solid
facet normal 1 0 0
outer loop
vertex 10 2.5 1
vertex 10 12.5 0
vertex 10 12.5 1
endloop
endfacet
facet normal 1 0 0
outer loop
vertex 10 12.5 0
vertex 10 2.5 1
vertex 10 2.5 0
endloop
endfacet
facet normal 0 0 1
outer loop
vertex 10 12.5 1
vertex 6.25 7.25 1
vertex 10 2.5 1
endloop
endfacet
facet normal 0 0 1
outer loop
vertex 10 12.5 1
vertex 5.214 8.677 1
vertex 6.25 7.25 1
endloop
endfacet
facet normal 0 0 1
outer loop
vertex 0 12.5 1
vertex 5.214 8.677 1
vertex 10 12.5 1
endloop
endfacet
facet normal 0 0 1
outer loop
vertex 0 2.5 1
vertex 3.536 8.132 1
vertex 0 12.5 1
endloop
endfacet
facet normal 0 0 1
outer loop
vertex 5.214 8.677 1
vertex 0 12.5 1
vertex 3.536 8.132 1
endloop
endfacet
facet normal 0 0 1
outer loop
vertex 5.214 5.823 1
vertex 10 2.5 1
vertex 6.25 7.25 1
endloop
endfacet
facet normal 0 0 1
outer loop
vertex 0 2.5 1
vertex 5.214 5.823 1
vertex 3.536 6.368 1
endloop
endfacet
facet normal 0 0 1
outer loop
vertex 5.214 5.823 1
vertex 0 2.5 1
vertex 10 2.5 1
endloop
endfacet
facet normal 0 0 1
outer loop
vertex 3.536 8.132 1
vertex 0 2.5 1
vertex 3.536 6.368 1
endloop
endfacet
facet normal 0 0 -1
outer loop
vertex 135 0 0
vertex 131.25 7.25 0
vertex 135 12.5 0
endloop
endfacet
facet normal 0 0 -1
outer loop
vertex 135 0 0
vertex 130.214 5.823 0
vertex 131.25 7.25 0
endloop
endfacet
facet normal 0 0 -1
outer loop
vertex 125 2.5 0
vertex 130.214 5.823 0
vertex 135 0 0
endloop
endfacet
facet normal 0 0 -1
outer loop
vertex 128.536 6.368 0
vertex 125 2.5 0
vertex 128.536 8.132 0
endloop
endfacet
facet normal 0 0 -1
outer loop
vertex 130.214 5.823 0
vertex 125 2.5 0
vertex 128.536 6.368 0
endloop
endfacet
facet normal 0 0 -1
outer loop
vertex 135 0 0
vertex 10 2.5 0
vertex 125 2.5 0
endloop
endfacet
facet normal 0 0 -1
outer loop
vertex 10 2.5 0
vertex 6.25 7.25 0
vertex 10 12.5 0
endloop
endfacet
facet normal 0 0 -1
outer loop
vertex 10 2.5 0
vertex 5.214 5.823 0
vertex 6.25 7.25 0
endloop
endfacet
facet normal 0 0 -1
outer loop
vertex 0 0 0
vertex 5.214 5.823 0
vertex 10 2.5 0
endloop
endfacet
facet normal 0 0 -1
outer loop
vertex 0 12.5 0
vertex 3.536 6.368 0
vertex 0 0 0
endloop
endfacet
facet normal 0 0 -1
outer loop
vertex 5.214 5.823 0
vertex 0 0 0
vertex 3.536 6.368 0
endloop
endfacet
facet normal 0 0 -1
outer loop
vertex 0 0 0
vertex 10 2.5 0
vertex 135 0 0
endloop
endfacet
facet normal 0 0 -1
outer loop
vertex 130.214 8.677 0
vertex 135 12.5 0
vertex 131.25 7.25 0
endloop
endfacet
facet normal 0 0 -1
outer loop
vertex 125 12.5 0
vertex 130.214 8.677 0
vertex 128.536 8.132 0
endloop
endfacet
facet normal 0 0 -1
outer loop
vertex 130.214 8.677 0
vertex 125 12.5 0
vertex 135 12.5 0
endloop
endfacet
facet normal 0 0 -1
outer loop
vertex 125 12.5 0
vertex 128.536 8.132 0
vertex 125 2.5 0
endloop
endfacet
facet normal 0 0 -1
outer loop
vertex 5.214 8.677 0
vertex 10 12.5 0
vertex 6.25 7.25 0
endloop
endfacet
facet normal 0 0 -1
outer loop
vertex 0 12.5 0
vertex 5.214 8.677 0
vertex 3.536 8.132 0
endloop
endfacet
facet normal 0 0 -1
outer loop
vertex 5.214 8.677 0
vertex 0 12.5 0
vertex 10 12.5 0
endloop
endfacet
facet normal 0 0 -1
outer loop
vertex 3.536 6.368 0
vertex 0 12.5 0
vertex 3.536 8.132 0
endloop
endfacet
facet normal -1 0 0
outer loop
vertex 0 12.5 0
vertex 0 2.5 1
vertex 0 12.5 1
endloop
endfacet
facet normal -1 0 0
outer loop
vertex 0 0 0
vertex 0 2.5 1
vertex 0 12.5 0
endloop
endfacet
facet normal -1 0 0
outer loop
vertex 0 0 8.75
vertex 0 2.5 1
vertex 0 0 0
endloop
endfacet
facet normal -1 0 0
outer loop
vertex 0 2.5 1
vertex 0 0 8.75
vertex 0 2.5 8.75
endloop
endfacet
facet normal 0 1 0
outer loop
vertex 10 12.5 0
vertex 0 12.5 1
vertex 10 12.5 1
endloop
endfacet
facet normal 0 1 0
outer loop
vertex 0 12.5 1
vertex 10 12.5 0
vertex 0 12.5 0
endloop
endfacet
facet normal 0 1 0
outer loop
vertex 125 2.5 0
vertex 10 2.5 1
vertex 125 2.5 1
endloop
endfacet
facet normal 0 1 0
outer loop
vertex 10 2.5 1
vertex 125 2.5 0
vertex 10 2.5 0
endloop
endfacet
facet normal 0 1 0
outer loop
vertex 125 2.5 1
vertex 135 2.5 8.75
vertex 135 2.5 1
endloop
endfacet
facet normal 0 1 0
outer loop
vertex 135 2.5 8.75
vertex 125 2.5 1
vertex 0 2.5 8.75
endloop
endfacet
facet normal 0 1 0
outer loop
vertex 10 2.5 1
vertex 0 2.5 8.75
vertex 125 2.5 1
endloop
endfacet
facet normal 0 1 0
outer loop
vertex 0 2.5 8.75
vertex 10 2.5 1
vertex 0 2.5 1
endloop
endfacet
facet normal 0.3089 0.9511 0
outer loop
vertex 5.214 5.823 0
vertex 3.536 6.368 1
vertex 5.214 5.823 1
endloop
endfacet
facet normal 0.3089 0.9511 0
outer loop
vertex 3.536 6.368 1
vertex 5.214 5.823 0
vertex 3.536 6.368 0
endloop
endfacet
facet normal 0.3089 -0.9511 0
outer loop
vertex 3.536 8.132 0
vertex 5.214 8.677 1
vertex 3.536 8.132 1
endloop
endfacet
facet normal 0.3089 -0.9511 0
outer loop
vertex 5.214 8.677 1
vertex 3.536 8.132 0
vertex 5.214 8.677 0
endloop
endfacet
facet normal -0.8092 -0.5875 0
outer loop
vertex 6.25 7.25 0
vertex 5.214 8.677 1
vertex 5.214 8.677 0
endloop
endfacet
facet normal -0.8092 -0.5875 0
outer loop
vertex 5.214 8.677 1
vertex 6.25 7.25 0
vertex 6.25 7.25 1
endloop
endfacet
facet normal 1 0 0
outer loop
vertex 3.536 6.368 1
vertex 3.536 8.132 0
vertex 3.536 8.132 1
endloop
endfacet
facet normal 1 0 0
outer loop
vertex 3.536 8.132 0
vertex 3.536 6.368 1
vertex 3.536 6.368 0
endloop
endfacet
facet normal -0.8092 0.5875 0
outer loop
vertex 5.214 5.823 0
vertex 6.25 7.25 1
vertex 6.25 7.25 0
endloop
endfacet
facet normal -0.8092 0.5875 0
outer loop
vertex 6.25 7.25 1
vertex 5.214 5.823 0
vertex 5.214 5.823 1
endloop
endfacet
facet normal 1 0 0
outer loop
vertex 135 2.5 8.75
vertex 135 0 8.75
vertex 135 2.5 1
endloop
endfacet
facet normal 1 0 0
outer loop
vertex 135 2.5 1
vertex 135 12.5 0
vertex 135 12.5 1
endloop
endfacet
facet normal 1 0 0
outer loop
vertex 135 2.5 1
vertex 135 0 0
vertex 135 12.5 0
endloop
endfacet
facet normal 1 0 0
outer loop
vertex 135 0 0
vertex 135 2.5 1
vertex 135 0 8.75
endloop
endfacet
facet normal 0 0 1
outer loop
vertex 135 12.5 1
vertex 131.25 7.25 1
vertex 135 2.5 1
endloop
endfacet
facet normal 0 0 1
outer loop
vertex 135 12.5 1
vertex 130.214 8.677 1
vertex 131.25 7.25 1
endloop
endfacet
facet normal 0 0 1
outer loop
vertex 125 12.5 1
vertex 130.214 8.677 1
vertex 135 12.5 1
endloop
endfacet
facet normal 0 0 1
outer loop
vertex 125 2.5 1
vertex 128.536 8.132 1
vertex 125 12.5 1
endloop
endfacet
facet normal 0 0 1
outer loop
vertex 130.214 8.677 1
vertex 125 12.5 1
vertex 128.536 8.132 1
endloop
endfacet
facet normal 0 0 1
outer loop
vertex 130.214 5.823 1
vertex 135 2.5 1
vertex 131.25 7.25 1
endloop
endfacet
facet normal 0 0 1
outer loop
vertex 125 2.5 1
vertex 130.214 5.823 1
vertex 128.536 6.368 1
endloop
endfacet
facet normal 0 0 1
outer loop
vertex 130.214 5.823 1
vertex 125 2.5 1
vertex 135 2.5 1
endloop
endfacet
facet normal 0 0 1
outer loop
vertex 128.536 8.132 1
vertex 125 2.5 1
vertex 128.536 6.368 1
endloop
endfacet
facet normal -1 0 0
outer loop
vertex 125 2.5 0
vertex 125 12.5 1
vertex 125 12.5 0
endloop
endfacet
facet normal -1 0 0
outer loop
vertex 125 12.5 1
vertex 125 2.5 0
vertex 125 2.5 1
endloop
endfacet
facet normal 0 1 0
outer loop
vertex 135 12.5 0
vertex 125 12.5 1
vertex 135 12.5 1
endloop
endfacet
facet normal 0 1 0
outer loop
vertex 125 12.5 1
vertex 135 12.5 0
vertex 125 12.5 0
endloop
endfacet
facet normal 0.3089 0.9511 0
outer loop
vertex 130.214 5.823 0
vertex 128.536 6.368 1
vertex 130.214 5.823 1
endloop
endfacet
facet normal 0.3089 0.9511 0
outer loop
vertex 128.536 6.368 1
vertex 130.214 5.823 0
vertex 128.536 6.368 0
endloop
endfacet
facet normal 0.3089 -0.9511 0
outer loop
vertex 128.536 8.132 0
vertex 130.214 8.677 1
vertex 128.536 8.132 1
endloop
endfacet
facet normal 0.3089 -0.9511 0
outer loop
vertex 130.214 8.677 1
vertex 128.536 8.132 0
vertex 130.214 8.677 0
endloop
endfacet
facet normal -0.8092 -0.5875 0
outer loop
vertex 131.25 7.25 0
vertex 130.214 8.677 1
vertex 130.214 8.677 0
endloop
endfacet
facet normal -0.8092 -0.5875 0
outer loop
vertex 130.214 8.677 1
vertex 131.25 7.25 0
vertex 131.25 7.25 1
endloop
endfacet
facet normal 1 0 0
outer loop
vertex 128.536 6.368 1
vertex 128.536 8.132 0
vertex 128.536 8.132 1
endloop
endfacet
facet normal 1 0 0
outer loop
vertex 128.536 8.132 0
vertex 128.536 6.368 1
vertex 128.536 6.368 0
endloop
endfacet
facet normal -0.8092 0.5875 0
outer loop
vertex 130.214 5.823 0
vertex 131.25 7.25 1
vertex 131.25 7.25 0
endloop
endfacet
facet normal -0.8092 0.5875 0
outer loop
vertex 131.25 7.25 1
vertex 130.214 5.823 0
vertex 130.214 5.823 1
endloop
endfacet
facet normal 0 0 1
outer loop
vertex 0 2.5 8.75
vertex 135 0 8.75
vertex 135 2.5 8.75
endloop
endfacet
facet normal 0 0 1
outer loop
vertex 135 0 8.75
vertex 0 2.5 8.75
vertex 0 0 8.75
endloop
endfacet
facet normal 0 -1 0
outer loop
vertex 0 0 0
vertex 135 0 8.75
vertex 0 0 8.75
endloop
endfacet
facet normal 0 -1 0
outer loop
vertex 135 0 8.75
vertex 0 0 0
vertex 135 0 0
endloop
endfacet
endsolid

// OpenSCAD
// Create the closer facing of the two straight walls

// Define the wall itself
cube([135, 2.5, 8.75]);

// Define constants used for supports that will attach the case to the frame
raftSideLength = 10;
raftHeight = 1;
raftScrewHoleRadius = 1.5;
screwHoleOffset = 4.75;

// Create two rafts (one in at each end) that will be used to secure this part to the steel plate
translate([0,2.5,0]) {
    difference() {
        cube([raftSideLength,raftSideLength,raftHeight]);
        translate([screwHoleOffset,screwHoleOffset,0]) {
            cylinder(h=raftHeight, r=raftScrewHoleRadius);
        }
    }
}

translate([125,2.5,0]) {
    difference() {
        cube([raftSideLength,raftSideLength,raftHeight]);
        translate([screwHoleOffset,screwHoleOffset,0]) {
            cylinder(h=raftHeight, r=raftScrewHoleRadius);
        }
    }
}
